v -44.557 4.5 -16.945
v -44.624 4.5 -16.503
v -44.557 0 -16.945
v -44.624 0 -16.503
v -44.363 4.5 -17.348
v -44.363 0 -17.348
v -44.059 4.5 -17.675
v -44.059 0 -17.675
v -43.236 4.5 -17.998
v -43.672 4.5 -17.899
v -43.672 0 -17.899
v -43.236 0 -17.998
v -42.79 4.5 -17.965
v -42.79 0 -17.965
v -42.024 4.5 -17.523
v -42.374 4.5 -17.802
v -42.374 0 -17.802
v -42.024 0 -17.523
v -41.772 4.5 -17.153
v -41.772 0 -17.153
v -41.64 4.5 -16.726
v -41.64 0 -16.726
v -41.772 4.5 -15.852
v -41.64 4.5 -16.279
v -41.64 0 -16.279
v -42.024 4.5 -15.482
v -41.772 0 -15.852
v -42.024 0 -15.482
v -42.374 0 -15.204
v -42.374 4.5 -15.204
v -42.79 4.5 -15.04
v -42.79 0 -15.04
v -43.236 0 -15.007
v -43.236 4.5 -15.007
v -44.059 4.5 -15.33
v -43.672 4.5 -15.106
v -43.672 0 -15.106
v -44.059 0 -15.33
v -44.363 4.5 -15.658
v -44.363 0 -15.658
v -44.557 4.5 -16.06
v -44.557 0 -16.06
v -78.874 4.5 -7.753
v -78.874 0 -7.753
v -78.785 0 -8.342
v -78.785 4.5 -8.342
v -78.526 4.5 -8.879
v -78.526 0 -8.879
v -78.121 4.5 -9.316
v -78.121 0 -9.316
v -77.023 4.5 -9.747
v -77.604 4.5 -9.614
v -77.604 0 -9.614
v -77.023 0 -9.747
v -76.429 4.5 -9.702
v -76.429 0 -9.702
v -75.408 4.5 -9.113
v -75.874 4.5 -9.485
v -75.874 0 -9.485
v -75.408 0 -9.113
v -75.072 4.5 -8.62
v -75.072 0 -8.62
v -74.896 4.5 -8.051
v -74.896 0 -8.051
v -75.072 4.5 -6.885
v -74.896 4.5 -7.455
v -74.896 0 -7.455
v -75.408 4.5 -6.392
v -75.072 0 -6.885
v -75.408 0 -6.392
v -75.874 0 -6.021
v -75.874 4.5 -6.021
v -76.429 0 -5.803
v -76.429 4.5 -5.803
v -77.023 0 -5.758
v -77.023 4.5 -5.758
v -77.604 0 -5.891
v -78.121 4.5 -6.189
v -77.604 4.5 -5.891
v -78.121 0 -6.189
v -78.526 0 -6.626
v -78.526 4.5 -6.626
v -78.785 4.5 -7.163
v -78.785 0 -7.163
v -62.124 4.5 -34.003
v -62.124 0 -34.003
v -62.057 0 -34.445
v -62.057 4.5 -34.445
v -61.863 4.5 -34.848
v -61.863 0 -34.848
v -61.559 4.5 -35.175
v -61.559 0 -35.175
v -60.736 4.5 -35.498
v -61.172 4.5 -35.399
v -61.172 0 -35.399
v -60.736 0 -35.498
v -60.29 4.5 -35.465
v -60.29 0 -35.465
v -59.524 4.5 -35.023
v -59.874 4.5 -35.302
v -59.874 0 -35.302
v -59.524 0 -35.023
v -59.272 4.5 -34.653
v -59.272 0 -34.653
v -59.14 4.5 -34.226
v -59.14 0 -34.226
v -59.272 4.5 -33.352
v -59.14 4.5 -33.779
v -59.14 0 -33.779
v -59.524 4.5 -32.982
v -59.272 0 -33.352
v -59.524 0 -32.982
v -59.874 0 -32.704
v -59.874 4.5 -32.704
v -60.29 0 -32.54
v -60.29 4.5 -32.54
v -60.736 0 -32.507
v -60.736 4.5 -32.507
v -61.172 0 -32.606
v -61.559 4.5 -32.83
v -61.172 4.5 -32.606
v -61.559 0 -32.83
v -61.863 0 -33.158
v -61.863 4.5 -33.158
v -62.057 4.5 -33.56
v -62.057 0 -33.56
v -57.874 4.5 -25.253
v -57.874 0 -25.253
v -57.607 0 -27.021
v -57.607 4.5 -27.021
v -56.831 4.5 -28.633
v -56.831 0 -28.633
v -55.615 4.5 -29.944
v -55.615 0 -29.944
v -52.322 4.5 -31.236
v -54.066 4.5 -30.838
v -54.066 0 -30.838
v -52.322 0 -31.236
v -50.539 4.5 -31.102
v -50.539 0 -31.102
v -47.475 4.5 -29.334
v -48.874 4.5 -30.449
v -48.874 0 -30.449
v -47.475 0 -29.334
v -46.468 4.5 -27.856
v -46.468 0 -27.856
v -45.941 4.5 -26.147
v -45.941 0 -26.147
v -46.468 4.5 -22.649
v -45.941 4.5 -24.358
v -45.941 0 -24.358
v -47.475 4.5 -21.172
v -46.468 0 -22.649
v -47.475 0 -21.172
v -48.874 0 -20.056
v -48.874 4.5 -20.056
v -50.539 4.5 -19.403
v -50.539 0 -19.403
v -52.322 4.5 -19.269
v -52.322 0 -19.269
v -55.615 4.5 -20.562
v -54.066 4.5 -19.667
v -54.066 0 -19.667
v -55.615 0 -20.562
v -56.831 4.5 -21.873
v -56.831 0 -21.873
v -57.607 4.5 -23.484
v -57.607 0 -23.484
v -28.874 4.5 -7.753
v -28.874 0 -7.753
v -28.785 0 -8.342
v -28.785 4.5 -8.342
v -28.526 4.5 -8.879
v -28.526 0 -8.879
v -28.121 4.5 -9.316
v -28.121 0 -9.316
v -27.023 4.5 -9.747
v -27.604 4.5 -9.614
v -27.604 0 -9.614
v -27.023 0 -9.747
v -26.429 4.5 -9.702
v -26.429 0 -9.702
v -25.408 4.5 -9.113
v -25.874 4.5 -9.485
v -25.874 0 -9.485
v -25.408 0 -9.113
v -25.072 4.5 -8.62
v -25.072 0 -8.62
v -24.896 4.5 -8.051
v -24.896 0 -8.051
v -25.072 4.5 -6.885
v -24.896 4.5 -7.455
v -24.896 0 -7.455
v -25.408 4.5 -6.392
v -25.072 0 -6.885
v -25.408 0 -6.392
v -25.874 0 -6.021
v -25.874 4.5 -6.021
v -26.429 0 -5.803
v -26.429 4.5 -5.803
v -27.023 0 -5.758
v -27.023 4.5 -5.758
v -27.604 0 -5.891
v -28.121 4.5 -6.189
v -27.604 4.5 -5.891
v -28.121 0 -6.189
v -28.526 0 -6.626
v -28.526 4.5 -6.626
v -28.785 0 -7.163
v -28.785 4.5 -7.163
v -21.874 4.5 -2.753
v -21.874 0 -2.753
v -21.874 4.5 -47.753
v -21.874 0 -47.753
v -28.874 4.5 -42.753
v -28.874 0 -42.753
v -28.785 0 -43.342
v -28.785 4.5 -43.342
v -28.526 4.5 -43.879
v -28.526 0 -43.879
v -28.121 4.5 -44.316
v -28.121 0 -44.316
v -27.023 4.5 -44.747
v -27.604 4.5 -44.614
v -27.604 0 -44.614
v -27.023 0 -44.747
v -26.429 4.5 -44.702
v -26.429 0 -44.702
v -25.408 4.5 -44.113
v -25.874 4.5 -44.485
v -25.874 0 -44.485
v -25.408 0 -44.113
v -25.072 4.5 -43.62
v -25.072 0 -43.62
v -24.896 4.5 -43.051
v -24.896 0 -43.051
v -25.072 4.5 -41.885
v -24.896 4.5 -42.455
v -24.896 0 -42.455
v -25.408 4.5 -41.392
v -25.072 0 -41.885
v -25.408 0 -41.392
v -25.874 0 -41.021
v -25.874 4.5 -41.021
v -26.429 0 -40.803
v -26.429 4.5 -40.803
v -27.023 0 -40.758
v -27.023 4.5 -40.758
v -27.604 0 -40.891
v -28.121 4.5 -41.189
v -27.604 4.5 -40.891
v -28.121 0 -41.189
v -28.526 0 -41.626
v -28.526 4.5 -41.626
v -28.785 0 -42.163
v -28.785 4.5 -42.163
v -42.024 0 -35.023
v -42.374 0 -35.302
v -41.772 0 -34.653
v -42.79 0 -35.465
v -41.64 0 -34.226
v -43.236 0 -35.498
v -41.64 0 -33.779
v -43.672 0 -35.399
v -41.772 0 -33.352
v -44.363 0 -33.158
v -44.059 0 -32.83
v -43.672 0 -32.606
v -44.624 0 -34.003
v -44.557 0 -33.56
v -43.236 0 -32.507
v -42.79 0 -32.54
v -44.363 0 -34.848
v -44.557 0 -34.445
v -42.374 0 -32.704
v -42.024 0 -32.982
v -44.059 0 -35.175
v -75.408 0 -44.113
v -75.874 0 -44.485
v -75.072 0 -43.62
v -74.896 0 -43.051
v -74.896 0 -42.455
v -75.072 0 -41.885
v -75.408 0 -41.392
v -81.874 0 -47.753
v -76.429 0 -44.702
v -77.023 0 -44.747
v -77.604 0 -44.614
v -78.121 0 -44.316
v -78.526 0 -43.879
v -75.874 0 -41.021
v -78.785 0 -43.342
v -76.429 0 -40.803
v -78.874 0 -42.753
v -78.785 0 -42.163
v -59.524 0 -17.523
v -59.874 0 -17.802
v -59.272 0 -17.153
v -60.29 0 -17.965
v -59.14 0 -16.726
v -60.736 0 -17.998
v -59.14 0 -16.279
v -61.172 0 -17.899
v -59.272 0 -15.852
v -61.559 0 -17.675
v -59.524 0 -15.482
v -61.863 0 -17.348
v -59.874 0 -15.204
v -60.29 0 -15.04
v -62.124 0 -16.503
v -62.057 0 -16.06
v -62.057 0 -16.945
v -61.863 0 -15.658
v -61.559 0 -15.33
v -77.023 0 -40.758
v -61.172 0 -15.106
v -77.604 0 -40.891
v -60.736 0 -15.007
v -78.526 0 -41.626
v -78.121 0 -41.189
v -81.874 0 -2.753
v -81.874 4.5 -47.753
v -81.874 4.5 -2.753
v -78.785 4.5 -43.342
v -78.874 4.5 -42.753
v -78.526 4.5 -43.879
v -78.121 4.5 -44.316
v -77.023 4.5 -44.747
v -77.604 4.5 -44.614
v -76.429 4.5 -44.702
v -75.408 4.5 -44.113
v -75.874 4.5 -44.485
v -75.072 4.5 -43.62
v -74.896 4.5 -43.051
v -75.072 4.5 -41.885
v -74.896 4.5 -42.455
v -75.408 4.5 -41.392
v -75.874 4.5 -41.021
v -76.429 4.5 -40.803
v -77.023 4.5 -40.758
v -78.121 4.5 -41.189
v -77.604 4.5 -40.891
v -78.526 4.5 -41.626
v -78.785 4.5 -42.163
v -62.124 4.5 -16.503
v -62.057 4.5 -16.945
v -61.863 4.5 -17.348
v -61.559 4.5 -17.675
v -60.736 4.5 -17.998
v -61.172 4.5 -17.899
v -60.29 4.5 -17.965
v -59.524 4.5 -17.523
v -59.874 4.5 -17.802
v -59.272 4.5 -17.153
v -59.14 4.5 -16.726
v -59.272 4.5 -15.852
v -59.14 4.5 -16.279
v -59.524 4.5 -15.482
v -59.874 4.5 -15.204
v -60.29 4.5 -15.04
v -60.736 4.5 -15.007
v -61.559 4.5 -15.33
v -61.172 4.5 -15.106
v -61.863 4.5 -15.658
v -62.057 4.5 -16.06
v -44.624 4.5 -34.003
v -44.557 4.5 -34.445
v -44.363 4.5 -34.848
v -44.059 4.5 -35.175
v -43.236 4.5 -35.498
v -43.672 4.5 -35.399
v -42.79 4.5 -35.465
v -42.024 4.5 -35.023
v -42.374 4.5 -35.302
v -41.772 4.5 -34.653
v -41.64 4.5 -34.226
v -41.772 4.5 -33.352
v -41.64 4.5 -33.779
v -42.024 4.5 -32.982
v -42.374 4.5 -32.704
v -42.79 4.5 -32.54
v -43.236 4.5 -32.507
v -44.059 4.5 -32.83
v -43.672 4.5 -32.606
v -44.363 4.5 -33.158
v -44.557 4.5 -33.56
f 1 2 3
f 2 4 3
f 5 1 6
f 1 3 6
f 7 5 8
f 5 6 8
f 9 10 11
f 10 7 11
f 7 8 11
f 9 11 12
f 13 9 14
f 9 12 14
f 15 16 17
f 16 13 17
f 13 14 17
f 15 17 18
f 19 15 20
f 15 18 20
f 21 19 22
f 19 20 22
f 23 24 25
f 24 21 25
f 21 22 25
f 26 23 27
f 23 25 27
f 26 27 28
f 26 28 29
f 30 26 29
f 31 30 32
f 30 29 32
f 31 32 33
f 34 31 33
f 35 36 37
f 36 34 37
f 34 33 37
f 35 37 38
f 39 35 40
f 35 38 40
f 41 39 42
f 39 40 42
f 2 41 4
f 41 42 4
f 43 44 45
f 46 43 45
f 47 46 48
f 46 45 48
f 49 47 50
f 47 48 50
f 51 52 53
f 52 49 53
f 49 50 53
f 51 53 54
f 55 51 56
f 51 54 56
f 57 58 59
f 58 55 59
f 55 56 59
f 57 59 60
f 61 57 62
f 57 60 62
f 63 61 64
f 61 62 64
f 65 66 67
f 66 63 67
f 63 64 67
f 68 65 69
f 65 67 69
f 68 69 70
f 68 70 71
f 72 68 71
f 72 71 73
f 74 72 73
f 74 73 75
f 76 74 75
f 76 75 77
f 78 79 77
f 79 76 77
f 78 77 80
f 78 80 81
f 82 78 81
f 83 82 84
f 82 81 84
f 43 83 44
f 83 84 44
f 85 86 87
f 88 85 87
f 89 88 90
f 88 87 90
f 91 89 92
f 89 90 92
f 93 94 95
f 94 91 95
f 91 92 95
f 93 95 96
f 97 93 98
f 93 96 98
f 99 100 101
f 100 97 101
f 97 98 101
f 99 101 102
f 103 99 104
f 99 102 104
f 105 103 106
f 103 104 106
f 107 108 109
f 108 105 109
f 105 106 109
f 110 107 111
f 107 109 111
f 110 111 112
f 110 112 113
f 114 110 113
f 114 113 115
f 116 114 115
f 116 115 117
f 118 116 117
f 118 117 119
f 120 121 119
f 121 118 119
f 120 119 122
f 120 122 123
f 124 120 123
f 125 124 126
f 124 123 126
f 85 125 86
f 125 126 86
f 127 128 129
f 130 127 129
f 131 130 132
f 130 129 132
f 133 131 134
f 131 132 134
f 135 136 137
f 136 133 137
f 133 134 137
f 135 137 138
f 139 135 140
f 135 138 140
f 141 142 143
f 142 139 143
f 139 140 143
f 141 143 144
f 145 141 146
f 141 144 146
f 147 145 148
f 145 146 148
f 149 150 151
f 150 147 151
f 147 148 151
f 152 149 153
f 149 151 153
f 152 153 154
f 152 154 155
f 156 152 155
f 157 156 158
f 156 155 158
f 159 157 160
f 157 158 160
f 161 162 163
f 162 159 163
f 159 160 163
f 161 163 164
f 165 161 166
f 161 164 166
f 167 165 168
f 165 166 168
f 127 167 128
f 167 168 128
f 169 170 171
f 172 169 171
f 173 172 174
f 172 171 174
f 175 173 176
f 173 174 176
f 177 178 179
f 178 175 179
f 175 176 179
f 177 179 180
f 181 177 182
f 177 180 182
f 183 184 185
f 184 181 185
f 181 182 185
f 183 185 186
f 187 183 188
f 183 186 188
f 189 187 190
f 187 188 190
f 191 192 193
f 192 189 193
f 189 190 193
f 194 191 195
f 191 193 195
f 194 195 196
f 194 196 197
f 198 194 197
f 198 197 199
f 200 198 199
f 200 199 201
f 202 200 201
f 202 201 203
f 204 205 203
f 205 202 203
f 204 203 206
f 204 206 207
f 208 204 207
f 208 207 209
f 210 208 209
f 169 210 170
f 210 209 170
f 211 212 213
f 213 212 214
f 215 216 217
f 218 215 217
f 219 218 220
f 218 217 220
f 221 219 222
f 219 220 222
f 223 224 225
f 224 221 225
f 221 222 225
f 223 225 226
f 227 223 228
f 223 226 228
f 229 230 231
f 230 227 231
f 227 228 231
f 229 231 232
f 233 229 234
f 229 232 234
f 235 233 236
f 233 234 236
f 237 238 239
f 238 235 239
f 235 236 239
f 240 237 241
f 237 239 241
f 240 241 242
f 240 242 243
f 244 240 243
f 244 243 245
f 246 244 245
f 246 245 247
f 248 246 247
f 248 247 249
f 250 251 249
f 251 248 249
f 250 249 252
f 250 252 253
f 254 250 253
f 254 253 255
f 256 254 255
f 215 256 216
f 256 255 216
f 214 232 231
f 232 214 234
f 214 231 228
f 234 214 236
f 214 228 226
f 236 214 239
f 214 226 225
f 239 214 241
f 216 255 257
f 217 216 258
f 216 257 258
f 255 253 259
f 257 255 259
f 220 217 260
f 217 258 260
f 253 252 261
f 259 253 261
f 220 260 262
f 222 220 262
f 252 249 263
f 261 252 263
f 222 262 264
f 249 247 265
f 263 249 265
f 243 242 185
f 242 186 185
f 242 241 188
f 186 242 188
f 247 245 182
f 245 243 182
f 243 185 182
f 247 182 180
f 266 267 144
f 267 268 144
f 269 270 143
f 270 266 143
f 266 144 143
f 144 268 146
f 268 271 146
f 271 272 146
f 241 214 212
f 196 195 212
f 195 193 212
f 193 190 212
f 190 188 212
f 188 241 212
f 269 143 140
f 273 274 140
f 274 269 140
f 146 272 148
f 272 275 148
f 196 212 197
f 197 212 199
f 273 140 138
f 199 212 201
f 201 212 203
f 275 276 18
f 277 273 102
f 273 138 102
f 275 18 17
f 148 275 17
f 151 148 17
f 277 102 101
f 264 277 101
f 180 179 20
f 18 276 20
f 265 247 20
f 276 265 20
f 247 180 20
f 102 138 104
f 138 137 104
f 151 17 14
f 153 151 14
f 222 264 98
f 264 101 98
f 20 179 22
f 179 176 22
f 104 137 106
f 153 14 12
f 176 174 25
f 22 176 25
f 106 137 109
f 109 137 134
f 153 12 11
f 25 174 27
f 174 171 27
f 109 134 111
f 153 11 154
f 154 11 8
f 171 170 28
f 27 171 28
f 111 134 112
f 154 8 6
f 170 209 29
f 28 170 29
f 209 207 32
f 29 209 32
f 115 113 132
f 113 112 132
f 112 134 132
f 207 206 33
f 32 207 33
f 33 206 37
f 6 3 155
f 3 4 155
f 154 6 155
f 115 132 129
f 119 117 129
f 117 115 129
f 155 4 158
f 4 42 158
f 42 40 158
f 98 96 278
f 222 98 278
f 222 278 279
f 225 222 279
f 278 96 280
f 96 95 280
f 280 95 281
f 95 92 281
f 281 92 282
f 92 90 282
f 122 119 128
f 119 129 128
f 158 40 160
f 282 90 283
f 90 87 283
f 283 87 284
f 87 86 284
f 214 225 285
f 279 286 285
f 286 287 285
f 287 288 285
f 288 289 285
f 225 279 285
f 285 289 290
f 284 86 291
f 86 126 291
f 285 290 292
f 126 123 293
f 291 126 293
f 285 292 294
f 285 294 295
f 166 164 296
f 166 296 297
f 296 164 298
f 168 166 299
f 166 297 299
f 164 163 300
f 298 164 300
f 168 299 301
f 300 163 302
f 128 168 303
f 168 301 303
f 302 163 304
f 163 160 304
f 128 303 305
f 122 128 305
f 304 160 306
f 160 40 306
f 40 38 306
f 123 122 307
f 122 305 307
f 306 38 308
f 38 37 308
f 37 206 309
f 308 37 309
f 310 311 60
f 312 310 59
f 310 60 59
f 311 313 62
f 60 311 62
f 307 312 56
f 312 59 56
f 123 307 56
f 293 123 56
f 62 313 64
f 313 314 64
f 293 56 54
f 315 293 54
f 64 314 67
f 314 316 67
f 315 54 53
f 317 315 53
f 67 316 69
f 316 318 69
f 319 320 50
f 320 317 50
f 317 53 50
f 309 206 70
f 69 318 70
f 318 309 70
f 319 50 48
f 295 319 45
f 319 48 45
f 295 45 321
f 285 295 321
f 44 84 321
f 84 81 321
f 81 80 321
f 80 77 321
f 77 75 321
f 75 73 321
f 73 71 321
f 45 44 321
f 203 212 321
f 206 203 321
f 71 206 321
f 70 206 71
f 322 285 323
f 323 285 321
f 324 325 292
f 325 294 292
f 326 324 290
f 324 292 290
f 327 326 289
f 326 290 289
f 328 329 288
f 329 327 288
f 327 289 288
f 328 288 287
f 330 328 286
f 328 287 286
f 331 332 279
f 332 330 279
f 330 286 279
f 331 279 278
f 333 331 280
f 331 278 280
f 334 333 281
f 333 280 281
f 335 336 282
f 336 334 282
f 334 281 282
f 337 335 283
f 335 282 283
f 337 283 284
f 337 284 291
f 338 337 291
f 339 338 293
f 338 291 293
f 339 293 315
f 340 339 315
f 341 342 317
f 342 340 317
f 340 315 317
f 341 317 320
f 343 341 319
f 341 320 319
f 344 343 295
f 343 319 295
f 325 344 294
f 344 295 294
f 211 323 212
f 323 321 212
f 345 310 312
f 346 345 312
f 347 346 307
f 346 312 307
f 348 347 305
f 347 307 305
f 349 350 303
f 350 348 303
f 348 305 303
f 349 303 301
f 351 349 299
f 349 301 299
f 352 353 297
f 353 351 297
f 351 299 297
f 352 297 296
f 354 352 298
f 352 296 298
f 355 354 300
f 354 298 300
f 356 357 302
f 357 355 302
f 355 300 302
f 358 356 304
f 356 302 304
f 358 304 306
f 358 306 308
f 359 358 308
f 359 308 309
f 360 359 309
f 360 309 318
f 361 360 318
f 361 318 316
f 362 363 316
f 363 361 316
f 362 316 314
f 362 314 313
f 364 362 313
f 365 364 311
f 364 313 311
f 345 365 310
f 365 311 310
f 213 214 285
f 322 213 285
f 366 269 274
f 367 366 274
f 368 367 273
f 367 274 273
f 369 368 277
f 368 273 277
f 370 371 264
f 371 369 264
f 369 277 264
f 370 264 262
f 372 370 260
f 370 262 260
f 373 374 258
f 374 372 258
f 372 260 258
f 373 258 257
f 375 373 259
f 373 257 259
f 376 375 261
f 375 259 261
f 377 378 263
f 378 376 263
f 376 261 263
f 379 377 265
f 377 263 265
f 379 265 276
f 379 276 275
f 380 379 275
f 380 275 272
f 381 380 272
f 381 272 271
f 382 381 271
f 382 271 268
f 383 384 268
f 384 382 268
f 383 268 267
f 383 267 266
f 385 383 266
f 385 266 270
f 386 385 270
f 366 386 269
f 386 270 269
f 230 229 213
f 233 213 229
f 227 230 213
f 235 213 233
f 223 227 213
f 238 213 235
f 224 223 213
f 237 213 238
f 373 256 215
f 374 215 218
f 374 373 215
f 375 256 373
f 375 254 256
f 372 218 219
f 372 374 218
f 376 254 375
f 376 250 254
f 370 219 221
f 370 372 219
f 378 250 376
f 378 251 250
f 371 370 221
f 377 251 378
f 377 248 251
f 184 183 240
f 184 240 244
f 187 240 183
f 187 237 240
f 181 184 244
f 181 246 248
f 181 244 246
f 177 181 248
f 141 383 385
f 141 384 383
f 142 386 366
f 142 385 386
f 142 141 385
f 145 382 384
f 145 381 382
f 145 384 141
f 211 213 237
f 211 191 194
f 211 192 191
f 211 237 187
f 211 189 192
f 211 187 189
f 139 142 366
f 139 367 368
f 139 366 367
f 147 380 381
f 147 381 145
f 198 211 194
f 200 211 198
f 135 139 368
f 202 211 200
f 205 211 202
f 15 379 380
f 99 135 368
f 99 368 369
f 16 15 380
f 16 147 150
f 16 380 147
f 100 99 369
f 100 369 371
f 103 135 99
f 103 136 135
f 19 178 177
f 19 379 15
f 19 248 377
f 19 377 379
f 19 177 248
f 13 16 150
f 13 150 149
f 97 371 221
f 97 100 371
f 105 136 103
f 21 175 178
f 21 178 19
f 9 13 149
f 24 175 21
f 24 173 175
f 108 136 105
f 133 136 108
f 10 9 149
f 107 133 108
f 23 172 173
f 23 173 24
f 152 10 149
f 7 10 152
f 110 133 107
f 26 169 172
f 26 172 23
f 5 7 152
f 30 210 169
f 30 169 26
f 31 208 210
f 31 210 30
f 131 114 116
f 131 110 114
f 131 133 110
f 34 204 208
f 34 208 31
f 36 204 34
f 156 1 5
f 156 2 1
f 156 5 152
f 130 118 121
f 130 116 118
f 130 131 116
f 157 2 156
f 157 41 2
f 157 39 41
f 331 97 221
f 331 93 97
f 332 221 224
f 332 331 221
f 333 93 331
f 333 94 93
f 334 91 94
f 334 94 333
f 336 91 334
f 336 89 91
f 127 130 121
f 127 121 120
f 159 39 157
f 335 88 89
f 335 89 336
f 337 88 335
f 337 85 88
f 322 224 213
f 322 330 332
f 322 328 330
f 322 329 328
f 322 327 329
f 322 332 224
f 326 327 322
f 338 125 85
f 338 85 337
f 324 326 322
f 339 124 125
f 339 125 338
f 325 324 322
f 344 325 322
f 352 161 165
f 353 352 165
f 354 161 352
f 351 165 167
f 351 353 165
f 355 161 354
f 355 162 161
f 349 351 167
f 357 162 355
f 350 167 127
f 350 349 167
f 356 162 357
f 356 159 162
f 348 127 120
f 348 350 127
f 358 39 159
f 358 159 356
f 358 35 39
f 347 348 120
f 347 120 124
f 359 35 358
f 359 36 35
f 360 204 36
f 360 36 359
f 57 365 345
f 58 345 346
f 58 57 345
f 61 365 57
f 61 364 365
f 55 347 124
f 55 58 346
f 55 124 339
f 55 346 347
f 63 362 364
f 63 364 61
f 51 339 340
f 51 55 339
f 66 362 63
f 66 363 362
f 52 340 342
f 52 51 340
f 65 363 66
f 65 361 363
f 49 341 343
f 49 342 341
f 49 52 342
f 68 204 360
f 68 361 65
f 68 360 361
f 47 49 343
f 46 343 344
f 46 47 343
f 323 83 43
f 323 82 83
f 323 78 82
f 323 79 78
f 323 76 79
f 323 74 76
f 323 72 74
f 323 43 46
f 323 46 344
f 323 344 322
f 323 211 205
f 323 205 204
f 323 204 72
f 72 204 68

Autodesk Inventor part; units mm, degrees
ref_plane "YZ Plane" through (0, 0, 0) normal (1, 0, 0) x (0, 1, 0)
ref_plane "XZ Plane" through (0, 0, 0) normal (0, 1, 0) x (-1, 0, 0)
ref_plane "XY Plane" through (0, 0, 0) normal (0, 0, 1) x (1, 0, 0)
sketch "Sketch1" plane through (0, 0, 0) normal (0, 1, 0) x (-1, 0, 0)
  line L0 (0, 0) -> (114.8965, 0) construction
  line L1 (114.8965, 0) -> (114.8965, -52.636) construction
  line L2 (114.8965, -52.636) -> (0, -52.636) construction
  line L3 (0, -52.636) -> (0, 0) construction
  line L4 (81.8737, -2.7526) -> (21.8737, -2.7526)
  line L5 (21.8737, -2.7526) -> (21.8737, -47.7526)
  line L6 (21.8737, -47.7526) -> (81.8737, -47.7526)
  line L7 (81.8737, -47.7526) -> (81.8737, -2.7526)
  circle A0 centre (76.8737, -7.7526) radius 2
  circle A1 centre (51.8737, -25.2526) radius 6
  circle A2 centre (26.8737, -7.7526) radius 2
  circle A3 centre (76.8737, -42.7526) radius 2
  circle A4 centre (26.8737, -42.7526) radius 2
  circle A5 centre (43.1237, -16.5026) radius 1.5
  circle A6 centre (43.1237, -34.0026) radius 1.5
  circle A7 centre (60.6237, -34.0026) radius 1.5
  circle A8 centre (60.6237, -16.5026) radius 1.5
  point P0 (51.8737, -47.7526)
  dimension "d1" = 60
  dimension "d4" = 45
  dimension "d5" = 4
  dimension "d6" = 5
  dimension "d7" = 5
  dimension "d9" = 12
  dimension "d10" = 22.5
  dimension "d11" = 30
  dimension "d16" = 50
  dimension "d19" = 35
  dimension "d37" = 3
  dimension "d49" = 360
  dimension "d52" = 17.5
extrude "Extrusion1" add sketch "Sketch1" along normal blind 4.5
properties part number "MotorBasePlate"
